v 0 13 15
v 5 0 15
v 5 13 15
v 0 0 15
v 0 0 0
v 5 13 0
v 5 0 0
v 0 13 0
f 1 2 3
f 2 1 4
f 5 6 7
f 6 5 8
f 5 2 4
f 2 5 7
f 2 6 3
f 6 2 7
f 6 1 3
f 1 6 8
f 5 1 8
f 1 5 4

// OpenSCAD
// Generated by SolidPython 1.0.1 on 2020-07-29 00:39:26


cube(size = [5, 13, 15]);
/***********************************************
*********      SolidPython code:      **********
************************************************
 
# import packages: SolidPython
from solid import *
from solid.utils import *
from itertools import chain, combinations


class Resize:

    def __init__(self, scad_file):
        self.scad_file = scad_file
        #self.scad_file = import_scad(scad_file)
        # cone/cylinder param:
        self.r1 = 0
        self.r2 = 0
        self.h = 0
        # rectangular prism param:
        self.w = 0
        self.l = 0
        # ellipse param:
        self.r = 0

    # import OpenScad code (file name corresponds to shape)


    # classify shape + parameters
    def assign(self, param1, param2, param3):
        if self.scad_file == 'cone.scad':
            self.r1 = param1
            self.r2 = param2
            self.h = param3
        elif self.scad_file == 'cylinder.scad':
            self.r1 = param1
            self.r2 = param2
            self.h = param3
        elif self.scad_file == 'rectangularPrism.scad':
            self.h = param1
            self.l = param2
            self.w = param3
        else:
            self.r = param1
            self.h = param2

    # resize parameters
    def iterate(self):
        x = range(3, 20, 2)
        i = 1
        if self.scad_file == 'cone.scad':
            tempList = list(combinations(x, 2))
            for temp in tempList:
                param1 = temp[0]
                param2 = temp[1]
                filepath = 'produced_scad_files/' + 'cone' + str(param1) + '_' + str(param2) + '_' + '.scad'
                scad_render_to_file(cylinder(h=param1, r1=param2, r2=0), filepath)

        elif self.scad_file == 'cylinder.scad':
            tempList = list(combinations(x, 3))
            for temp in tempList:
                param1 = temp[0]
                param2 = temp[1]
                filepath = 'produced_scad_files/' + 'cylinder' + str(param1) + '_' + str(param2) + '_' + '.scad'
                scad_render_to_file(cylinder(h=param1, r1=param2, r2=param2), filepath)

        elif self.scad_file == 'rectangularPrism.scad':
            tempList = list(combinations(x, 3))
            for temp in tempList:
                param1 = temp[0]
                param2 = temp[1]
                param3 = temp[2]
                filepath = 'produced_scad_files/' + 'rectangularPrism' + str(param1) + '_' + str(param2) + '_' + str(
                    param3) + '.scad'
                scad_render_to_file(cube(size=(param1, param2, param3)), filepath)

        elif self.scad_file == 'ellipse.scad':
            tempList = list(combinations(x, 4))
            for temp in tempList:
                param1 = temp[0]
                param2 = temp[1]
                param3 = temp[2]
                param4 = temp[3]
                filepath = 'produced_scad_files/' + 'ellipse' + str(param1) + '_' + str(param2) + '_' + str(param3) + '_' + str(param4) + '.scad'
                scad_render_to_file(scale([param1, param2, param3])(sphere(r=param4)), filepath)

    def render_to_scadfile(self):
        scad_render_to_file(scad, 'example.scad') 
 
************************************************/
